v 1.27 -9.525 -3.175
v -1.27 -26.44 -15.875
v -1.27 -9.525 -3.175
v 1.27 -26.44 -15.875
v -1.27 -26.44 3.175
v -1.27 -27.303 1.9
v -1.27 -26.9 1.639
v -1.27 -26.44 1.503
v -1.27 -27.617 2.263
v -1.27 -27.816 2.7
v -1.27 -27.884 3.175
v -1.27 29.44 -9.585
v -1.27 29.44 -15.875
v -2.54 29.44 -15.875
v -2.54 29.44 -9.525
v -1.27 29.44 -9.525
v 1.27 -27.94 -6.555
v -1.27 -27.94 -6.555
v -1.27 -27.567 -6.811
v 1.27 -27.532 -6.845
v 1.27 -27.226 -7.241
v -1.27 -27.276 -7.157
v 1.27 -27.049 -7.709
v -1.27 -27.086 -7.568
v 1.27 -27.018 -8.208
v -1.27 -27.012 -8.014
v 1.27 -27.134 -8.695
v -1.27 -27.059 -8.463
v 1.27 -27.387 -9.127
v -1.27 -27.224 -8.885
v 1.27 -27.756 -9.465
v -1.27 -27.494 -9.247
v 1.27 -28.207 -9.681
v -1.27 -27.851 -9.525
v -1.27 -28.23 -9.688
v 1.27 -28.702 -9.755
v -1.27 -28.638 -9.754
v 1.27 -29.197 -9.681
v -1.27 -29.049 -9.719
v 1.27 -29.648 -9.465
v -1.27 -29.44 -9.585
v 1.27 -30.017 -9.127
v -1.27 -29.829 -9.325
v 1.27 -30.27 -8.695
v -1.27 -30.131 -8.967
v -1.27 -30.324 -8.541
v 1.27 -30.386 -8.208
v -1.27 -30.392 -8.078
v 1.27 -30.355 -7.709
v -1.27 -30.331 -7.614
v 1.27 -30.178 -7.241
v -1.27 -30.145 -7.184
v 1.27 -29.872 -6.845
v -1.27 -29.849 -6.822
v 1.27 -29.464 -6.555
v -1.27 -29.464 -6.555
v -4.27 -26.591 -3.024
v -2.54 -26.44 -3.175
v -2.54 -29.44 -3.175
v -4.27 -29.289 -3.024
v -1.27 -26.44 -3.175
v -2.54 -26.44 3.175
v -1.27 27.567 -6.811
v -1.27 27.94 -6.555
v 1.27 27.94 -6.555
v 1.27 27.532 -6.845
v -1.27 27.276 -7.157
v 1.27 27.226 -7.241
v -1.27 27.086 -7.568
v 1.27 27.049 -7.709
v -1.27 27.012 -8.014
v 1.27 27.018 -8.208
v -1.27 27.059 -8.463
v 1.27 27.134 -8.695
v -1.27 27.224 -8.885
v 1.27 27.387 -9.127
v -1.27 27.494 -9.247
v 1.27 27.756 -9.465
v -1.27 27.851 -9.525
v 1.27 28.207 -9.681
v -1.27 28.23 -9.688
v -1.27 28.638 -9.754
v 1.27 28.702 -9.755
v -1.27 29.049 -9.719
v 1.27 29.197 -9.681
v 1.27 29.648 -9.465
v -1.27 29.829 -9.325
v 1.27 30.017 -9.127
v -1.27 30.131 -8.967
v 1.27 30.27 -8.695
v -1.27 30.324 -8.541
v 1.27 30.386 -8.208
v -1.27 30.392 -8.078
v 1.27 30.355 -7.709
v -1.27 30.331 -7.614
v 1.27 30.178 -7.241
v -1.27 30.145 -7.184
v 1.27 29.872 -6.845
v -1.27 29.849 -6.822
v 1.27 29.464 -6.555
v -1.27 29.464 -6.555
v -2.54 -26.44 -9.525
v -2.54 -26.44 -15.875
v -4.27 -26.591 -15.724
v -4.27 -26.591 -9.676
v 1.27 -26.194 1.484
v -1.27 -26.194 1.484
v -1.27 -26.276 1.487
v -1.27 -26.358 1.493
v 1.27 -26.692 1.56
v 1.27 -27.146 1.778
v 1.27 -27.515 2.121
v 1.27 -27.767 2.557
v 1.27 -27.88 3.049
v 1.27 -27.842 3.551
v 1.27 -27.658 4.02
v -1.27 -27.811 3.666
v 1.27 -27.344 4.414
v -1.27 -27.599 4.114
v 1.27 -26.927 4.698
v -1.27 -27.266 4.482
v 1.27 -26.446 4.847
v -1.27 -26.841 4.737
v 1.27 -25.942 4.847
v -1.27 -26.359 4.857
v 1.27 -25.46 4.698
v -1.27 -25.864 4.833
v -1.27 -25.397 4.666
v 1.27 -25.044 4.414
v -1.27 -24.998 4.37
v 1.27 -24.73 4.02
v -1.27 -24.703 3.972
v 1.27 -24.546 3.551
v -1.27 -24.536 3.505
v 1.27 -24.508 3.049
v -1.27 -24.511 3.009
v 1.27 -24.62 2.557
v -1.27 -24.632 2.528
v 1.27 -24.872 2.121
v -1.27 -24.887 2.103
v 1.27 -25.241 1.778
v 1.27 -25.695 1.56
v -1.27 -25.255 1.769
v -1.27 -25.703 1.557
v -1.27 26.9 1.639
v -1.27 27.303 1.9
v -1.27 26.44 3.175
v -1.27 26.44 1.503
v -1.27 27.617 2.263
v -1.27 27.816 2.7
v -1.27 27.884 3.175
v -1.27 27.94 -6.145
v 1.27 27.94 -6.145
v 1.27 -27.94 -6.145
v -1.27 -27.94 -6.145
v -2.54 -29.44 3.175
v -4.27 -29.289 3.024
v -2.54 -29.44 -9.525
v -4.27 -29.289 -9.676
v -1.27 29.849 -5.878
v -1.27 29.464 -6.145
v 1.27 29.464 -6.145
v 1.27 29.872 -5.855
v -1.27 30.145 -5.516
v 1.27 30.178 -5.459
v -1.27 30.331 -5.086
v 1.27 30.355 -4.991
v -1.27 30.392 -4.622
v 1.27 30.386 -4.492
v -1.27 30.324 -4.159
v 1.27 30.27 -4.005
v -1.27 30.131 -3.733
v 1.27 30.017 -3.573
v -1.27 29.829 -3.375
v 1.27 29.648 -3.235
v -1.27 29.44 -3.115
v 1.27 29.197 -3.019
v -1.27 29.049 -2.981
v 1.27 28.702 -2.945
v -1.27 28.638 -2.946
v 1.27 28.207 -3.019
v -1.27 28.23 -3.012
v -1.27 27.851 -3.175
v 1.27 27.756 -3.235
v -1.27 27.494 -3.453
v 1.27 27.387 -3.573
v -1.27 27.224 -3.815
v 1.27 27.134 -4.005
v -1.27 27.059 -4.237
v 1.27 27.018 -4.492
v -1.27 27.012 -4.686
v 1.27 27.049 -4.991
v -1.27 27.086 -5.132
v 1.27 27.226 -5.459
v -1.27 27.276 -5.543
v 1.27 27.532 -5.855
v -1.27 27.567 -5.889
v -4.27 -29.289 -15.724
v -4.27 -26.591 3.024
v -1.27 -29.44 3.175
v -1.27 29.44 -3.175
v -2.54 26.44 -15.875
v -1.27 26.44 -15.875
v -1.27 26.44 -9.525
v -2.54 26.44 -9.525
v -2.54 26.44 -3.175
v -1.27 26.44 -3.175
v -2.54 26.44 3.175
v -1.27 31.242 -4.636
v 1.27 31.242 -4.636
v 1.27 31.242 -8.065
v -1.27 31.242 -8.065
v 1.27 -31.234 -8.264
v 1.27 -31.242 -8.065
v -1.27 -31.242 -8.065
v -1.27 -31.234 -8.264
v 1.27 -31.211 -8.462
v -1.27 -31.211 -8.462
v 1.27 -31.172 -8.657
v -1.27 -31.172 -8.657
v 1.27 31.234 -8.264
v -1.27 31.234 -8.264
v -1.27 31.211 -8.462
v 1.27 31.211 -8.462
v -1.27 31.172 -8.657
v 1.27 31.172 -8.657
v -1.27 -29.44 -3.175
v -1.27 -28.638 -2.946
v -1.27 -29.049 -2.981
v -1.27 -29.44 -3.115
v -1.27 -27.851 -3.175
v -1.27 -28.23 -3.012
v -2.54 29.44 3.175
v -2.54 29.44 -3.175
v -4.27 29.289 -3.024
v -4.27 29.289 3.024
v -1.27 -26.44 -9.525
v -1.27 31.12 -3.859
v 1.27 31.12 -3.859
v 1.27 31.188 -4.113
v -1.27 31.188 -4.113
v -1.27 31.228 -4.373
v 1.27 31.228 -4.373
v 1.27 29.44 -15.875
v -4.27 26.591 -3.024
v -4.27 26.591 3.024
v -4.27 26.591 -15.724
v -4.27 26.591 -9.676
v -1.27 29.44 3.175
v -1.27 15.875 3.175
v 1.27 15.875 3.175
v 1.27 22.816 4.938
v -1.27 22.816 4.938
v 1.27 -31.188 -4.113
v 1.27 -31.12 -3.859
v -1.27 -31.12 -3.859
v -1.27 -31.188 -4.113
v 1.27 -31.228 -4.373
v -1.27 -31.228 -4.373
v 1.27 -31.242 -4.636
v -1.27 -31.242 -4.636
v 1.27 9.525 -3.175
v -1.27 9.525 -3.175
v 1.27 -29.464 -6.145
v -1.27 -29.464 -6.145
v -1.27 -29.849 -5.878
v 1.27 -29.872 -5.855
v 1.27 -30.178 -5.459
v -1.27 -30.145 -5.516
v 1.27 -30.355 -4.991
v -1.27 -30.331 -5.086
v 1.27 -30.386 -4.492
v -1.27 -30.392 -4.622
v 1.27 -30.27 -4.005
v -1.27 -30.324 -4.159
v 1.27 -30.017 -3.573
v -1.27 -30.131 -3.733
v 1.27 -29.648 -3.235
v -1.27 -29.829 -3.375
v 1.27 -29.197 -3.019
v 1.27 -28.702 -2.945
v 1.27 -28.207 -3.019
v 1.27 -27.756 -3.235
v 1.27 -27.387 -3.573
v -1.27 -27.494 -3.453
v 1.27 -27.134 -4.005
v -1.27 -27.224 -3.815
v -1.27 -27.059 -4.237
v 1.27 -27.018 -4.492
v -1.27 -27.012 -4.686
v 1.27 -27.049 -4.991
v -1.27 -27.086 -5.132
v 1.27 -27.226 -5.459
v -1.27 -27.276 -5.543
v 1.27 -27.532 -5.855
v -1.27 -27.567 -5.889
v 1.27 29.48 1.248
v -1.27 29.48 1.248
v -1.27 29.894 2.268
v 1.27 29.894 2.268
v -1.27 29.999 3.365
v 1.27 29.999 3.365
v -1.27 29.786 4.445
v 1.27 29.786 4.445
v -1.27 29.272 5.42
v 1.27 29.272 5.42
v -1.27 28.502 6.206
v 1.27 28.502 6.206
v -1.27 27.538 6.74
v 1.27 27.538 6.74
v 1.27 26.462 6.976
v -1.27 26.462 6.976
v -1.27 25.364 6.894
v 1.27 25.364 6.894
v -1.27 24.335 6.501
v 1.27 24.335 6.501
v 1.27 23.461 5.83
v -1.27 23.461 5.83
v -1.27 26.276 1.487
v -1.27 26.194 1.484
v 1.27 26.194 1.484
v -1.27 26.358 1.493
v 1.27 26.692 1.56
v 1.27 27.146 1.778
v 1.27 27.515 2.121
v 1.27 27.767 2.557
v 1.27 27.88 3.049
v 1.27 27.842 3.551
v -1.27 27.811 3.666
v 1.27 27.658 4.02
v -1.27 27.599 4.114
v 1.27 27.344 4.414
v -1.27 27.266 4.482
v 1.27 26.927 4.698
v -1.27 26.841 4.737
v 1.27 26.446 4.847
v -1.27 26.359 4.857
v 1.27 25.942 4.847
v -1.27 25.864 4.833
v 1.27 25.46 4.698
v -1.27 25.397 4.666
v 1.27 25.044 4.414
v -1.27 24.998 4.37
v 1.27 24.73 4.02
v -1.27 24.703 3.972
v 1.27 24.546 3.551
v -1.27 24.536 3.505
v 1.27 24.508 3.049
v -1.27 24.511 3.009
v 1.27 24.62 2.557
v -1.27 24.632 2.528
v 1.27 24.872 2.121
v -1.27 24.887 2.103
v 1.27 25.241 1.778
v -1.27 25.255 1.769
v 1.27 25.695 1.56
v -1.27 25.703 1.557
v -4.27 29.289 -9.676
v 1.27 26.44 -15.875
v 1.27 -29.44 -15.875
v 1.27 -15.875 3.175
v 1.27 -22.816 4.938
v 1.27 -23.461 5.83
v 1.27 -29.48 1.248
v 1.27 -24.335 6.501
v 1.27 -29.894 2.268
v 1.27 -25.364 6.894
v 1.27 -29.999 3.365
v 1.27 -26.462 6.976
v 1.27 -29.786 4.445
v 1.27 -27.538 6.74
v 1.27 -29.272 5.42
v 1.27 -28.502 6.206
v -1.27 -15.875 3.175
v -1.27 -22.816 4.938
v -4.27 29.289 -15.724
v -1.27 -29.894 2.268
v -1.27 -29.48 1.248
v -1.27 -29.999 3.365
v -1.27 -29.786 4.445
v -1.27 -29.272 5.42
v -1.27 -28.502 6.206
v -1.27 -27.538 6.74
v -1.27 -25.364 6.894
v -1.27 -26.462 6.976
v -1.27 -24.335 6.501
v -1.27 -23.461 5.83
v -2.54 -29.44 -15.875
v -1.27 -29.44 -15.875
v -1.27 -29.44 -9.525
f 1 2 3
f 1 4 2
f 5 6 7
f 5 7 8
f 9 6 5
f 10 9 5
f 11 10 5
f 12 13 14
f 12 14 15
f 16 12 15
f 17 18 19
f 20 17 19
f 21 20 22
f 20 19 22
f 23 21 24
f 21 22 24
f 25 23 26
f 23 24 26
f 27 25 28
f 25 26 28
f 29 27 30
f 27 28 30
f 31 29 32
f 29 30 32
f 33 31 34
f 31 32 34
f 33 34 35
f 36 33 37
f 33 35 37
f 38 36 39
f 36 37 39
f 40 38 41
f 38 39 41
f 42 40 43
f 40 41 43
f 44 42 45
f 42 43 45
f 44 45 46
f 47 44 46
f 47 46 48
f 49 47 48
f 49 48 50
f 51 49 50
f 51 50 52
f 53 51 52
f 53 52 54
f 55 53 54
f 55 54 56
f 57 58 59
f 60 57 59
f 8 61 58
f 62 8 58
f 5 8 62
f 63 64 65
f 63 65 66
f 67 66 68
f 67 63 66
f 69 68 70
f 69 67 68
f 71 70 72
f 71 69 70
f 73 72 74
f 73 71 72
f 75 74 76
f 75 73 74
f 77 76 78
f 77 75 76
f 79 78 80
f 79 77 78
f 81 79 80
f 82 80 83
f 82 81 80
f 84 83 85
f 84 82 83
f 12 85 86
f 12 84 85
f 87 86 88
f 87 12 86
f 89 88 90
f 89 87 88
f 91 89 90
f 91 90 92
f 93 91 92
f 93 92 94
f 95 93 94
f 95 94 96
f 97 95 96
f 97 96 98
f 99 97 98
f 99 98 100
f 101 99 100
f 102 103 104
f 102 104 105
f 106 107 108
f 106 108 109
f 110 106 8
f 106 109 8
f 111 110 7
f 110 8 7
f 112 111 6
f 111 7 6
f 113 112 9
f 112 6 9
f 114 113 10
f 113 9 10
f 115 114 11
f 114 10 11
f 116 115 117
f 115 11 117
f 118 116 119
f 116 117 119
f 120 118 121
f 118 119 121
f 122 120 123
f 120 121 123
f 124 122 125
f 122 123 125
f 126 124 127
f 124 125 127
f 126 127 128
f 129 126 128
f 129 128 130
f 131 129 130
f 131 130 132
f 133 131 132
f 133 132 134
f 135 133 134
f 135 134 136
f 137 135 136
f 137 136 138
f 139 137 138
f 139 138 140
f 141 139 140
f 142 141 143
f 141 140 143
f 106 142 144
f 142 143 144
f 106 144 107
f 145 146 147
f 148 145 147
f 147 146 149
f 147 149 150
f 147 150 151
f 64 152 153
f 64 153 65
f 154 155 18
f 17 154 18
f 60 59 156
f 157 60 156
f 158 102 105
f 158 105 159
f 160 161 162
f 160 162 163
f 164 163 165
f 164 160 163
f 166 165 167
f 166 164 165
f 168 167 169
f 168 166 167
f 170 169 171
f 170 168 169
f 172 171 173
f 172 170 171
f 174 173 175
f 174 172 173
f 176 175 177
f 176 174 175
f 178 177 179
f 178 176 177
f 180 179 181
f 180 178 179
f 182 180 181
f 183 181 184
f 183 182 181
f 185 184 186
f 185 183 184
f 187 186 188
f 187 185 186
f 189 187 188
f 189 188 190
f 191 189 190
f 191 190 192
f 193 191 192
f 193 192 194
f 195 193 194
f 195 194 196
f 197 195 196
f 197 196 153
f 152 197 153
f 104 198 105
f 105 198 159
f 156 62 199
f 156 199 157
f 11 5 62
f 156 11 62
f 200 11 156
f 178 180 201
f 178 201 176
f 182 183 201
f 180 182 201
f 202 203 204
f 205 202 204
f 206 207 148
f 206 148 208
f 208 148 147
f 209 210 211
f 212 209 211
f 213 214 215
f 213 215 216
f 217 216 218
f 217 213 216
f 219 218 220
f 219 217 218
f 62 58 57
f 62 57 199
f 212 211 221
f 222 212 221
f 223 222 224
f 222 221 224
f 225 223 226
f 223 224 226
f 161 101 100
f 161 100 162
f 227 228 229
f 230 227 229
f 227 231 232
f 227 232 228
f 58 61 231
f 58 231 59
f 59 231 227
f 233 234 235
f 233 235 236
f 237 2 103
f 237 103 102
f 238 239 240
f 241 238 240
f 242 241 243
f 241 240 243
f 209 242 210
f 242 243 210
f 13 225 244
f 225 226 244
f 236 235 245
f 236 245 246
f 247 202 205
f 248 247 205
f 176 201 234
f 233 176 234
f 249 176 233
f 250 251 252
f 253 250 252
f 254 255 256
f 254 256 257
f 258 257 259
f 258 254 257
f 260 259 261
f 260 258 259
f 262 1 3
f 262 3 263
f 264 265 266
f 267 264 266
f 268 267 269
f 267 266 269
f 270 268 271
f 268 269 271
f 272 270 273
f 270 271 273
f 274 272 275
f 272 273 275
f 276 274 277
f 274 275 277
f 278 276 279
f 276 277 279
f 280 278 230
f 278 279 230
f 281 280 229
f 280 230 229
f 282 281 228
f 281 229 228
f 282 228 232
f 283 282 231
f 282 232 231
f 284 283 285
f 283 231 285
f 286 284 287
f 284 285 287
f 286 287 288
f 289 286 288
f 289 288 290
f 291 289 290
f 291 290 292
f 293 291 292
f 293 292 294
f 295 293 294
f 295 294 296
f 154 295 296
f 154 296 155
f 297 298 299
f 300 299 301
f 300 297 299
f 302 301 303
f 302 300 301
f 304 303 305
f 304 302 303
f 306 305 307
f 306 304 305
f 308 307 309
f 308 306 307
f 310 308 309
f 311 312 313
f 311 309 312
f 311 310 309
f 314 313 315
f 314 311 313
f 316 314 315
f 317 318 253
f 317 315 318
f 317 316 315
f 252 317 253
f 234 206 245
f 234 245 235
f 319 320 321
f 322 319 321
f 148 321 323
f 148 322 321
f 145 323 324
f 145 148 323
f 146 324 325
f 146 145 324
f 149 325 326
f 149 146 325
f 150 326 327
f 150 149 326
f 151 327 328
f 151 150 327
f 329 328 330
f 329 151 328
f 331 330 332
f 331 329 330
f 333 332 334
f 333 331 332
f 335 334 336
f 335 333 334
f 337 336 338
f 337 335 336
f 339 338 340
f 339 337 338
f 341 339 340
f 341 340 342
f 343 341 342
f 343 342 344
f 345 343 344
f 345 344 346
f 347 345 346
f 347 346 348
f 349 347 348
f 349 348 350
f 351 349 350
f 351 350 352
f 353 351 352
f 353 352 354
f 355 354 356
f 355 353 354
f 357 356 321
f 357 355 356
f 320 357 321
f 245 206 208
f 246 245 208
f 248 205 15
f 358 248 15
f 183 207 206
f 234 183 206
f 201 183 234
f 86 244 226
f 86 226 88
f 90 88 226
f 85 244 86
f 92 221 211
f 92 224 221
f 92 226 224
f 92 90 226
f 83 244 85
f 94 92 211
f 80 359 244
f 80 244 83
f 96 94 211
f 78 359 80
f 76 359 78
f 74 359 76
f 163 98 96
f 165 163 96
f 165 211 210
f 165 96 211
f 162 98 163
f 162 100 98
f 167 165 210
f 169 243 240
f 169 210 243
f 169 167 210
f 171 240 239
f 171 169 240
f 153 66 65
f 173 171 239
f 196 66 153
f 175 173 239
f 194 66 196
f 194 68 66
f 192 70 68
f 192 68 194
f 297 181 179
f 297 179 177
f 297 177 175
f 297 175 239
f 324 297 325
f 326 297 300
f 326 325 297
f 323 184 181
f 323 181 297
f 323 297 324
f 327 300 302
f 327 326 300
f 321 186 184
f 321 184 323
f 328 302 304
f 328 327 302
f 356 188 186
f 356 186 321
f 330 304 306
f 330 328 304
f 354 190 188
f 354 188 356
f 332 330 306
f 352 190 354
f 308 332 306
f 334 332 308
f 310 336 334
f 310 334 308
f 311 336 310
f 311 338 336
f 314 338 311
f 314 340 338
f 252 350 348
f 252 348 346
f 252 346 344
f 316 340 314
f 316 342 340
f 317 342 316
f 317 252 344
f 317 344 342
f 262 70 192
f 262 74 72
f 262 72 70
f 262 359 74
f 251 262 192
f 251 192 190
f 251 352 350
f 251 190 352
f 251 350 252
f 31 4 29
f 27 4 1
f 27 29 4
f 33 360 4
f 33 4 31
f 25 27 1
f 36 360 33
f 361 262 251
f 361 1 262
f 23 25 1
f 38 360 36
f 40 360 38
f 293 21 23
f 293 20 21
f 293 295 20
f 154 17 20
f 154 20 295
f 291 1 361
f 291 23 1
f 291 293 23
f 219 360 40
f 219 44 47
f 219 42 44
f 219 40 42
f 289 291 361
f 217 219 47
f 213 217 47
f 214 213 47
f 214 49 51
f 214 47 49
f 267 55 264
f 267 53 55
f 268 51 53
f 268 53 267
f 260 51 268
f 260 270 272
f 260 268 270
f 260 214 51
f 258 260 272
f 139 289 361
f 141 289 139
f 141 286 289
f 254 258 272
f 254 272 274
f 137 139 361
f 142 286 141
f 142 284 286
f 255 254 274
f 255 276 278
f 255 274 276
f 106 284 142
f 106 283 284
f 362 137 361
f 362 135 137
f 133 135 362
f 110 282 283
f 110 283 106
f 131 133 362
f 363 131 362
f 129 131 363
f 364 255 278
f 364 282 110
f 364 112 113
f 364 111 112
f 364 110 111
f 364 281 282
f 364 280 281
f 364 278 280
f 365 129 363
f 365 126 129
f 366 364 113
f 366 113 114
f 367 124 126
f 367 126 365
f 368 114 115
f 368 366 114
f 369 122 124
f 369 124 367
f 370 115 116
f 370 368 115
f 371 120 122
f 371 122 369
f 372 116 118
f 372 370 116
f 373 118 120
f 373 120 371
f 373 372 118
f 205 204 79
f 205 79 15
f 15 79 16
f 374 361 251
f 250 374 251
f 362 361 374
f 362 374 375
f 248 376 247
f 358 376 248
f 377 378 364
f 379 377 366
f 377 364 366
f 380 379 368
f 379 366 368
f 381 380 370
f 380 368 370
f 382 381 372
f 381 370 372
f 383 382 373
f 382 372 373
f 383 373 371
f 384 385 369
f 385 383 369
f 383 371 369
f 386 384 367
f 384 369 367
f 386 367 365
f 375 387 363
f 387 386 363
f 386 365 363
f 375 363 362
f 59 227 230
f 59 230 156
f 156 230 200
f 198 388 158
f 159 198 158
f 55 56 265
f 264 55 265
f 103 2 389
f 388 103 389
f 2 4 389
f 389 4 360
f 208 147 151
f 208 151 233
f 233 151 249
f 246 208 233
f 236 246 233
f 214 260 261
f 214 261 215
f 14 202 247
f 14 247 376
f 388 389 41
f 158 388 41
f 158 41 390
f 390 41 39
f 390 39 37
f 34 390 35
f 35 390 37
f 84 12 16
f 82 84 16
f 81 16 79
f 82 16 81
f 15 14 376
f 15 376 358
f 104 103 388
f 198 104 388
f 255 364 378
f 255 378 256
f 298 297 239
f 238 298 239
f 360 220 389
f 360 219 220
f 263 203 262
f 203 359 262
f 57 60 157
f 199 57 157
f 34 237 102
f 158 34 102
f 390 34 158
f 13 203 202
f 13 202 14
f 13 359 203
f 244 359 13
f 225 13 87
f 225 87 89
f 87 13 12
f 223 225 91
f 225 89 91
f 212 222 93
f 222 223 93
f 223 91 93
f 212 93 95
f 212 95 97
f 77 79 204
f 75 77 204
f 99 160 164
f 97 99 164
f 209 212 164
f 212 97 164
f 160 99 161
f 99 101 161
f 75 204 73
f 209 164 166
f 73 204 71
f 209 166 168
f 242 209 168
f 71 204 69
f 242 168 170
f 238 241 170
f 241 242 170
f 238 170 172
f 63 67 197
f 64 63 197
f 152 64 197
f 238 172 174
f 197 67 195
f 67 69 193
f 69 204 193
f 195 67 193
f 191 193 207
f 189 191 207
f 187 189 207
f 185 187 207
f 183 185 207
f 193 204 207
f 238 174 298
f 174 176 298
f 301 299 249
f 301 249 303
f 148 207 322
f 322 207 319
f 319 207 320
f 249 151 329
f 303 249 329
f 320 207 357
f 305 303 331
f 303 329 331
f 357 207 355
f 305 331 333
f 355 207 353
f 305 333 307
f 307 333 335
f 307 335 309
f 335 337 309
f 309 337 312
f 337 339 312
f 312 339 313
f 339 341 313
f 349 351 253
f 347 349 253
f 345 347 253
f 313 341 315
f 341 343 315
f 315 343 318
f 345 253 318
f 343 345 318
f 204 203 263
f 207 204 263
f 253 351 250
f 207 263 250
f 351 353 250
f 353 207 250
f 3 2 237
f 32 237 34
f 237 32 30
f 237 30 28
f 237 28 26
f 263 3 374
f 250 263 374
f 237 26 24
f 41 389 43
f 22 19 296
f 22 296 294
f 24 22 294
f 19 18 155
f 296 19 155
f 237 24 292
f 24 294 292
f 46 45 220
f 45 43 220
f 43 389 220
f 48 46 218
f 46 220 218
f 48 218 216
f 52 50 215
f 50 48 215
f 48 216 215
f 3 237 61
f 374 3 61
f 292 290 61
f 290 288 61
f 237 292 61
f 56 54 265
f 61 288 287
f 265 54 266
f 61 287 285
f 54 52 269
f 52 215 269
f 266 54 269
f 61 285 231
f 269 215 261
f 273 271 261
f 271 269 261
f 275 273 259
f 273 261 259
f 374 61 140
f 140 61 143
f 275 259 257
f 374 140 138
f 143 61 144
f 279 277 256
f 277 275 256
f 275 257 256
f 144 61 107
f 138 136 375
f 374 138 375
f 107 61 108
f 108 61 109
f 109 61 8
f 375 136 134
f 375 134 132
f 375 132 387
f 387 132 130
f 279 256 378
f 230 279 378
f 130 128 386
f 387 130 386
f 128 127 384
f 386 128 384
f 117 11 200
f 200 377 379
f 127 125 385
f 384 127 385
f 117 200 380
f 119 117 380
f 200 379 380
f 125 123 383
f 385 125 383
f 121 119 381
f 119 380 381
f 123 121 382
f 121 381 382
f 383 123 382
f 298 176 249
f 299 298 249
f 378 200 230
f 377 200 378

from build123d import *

# Parameters (mm, degrees)
SKETCH3_R                = 3.81
DOWELSUPPORT_DEPTH       = 1.27
SKETCH5_W                = 6.35
SKETCH5_H                = 31.75
SLIDERDOWELSUPPORT_DEPTH = 1.27
STRINGDOWELSUPPORT_DEPTH = 1.27
SKETCH9_W                = 6.35
SKETCH9_H                = 3
TABSUPPORT_DEPTH         = 1.27
INTERSUPPORT_DEPTH       = 1.27
DOWELHOLES_DEPTH         = 36.066951521
DOWELHOLES_DEPTH_BACK    = 36.066951521
SKETCH11_R               = 1.690500048
SKETCH14_W               = 6.35
SKETCH14_H               = 3
TABBASE_DEPTH            = 1.27
SKETCH15_W               = 6.35
SKETCH15_H               = 3
TABDRAFT_DEPTH           = 1.73
TABDRAFT_DRAFT           = 5
TABDRAFT_PROFILE_2_DEPTH = 1.73
TABDRAFT_PROFILE_2_DRAFT = 5


with BuildPart() as part:
    # Sketch3 → DowelSupport (new, symmetric)
    with BuildSketch(Plane(origin=(0, 0, 0), x_dir=(0, 0, -1), z_dir=(1, 0, 0))):
        with Locations((-3.175, 26.19375)):
            Circle(SKETCH3_R)
    extrude(amount=DOWELSUPPORT_DEPTH, both=True)



with BuildPart() as body_2:
    # Sketch5 → SliderDowelSupport (new, symmetric)
    with BuildSketch(Plane(origin=(0, 0, 0), x_dir=(0, 0, -1), z_dir=(1, 0, 0))):
        Rectangle(SKETCH5_W, SKETCH5_H)
    extrude(amount=SLIDERDOWELSUPPORT_DEPTH, both=True)


with BuildPart() as body_3:
    # Sketch8 → StringDowelSupport (new, symmetric)
    with BuildSketch(Plane(origin=(0, 0, 0), x_dir=(0, 0, -1), z_dir=(1, 0, 0))):
        with BuildLine():
            Line((4.6355, 31.242), (8.0645, 31.242))
            ThreePointArc((8.0645, 31.242), (10.6045, 28.702), (8.0645, 26.162))
            Line((8.0645, 26.162), (4.6355, 26.162))
            ThreePointArc((4.6355, 26.162), (2.0955, 28.702), (4.6355, 31.242))
        make_face()
    extrude(amount=STRINGDOWELSUPPORT_DEPTH, both=True)


with BuildPart() as part_1:
    add(part.part)

    add(body_3.part)  # TabSupport merges body 3
    # Sketch9 → TabSupport (add, symmetric)
    with BuildSketch(Plane(origin=(0, 0, 0), x_dir=(0, 0, -1), z_dir=(1, 0, 0))):
        with Locations((0, 27.94)):
            Rectangle(SKETCH9_W, SKETCH9_H)
        with Locations((12.7, 27.94)):
            Rectangle(SKETCH9_W, SKETCH9_H)
    extrude(amount=TABSUPPORT_DEPTH, both=True)


    add(body_2.part)  # InterSupport merges body 2
    # Sketch10 → InterSupport (add, symmetric)
    with BuildSketch(Plane(origin=(0, 0, 0), x_dir=(0, 0, -1), z_dir=(1, 0, 0))):
        Polygon((-3.175, 15.875), (-5.636846154, 25.568519231), (-3.951626852, 28.612107032), (3.858873148, 31.120357032), (8.657140431, 31.171894192), (15.875, 29.44), (15.875, 26.44), (3.175, 9.525), (3.175, 15.875), align=None)
    extrude(amount=INTERSUPPORT_DEPTH, both=True)

    # Sketch11 → DowelHoles (cut, two sides: drawn at the far end of the back side and taken through both)
    with BuildSketch(Plane(origin=(0, 0, 0), x_dir=(0, 0, -1), z_dir=(1, 0, 0)).offset(-DOWELHOLES_DEPTH_BACK)):
        with Locations((-3.175, 26.19375)):
            Circle(SKETCH11_R)
        with BuildLine():
            Line((6.144521674, 27.94), (6.555478326, 27.94))
            ThreePointArc((6.555478326, 27.94), (9.755000048, 28.702), (6.555478326, 29.464))
            Line((6.555478326, 29.464), (6.144521674, 29.464))
            ThreePointArc((6.144521674, 29.464), (2.944999952, 28.702), (6.144521674, 27.94))
        make_face()
    extrude(amount=DOWELHOLES_DEPTH + DOWELHOLES_DEPTH_BACK, mode=Mode.SUBTRACT)

    # Sketch14 → TabBase (add)
    with BuildSketch(Plane.ZY.offset(1.27)):
        with Locations((-12.7, 27.94)):
            Rectangle(SKETCH14_W, SKETCH14_H)
        with Locations((0, 27.94)):
            Rectangle(SKETCH14_W, SKETCH14_H)
    extrude(amount=TABBASE_DEPTH)


with BuildPart() as tabdraft_tool:
    # Sketch15 → TabDraft (with draft: the straight prism first)
    with BuildSketch(Plane.ZY.offset(2.54)):
        with Locations((0, 27.94)):
            Rectangle(SKETCH15_W, SKETCH15_H)
    extrude(amount=TABDRAFT_DEPTH)
    # TabDraft: the draft: its side faces are tilted about the plane it starts from
    tabdraft_sides = [tabdraft_tool.faces().sort_by_distance(p)[0] for p in [
        (-3.405, 27.94, -3.175),
        (-3.405, 26.44, 0),
        (-3.405, 27.94, 3.175),
        (-3.405, 29.44, 0),
    ]]
    draft(tabdraft_sides, Plane.ZY.offset(2.54), TABDRAFT_DRAFT)


with BuildPart() as part_2:
    add(part_1.part)

    # TabDraft: add tabdraft_tool
    add(tabdraft_tool.part)


with BuildPart() as tabdraft_profile_2_tool:
    # Sketch15 → TabDraft profile 2 (with draft: the straight prism first)
    with BuildSketch(Plane.ZY.offset(2.54)):
        with Locations((-12.7, 27.94)):
            Rectangle(SKETCH15_W, SKETCH15_H)
    extrude(amount=TABDRAFT_PROFILE_2_DEPTH)
    # TabDraft profile 2: the draft: its side faces are tilted about the plane it starts from
    tabdraft_profile_2_sides = [tabdraft_profile_2_tool.faces().sort_by_distance(p)[0] for p in [
        (-3.405, 27.94, -15.875),
        (-3.405, 26.44, -12.7),
        (-3.405, 27.94, -9.525),
        (-3.405, 29.44, -12.7),
    ]]
    draft(tabdraft_profile_2_sides, Plane.ZY.offset(2.54), TABDRAFT_PROFILE_2_DRAFT)


with BuildPart() as part_3:
    add(part_2.part)

    # TabDraft profile 2: add tabdraft_profile_2_tool
    add(tabdraft_profile_2_tool.part)

    # Mirror1: part across plane


with BuildPart() as part_4:
    add(part_3.part)
    add(part_3.part.mirror(Plane.ZX))


solid = part_4.part
